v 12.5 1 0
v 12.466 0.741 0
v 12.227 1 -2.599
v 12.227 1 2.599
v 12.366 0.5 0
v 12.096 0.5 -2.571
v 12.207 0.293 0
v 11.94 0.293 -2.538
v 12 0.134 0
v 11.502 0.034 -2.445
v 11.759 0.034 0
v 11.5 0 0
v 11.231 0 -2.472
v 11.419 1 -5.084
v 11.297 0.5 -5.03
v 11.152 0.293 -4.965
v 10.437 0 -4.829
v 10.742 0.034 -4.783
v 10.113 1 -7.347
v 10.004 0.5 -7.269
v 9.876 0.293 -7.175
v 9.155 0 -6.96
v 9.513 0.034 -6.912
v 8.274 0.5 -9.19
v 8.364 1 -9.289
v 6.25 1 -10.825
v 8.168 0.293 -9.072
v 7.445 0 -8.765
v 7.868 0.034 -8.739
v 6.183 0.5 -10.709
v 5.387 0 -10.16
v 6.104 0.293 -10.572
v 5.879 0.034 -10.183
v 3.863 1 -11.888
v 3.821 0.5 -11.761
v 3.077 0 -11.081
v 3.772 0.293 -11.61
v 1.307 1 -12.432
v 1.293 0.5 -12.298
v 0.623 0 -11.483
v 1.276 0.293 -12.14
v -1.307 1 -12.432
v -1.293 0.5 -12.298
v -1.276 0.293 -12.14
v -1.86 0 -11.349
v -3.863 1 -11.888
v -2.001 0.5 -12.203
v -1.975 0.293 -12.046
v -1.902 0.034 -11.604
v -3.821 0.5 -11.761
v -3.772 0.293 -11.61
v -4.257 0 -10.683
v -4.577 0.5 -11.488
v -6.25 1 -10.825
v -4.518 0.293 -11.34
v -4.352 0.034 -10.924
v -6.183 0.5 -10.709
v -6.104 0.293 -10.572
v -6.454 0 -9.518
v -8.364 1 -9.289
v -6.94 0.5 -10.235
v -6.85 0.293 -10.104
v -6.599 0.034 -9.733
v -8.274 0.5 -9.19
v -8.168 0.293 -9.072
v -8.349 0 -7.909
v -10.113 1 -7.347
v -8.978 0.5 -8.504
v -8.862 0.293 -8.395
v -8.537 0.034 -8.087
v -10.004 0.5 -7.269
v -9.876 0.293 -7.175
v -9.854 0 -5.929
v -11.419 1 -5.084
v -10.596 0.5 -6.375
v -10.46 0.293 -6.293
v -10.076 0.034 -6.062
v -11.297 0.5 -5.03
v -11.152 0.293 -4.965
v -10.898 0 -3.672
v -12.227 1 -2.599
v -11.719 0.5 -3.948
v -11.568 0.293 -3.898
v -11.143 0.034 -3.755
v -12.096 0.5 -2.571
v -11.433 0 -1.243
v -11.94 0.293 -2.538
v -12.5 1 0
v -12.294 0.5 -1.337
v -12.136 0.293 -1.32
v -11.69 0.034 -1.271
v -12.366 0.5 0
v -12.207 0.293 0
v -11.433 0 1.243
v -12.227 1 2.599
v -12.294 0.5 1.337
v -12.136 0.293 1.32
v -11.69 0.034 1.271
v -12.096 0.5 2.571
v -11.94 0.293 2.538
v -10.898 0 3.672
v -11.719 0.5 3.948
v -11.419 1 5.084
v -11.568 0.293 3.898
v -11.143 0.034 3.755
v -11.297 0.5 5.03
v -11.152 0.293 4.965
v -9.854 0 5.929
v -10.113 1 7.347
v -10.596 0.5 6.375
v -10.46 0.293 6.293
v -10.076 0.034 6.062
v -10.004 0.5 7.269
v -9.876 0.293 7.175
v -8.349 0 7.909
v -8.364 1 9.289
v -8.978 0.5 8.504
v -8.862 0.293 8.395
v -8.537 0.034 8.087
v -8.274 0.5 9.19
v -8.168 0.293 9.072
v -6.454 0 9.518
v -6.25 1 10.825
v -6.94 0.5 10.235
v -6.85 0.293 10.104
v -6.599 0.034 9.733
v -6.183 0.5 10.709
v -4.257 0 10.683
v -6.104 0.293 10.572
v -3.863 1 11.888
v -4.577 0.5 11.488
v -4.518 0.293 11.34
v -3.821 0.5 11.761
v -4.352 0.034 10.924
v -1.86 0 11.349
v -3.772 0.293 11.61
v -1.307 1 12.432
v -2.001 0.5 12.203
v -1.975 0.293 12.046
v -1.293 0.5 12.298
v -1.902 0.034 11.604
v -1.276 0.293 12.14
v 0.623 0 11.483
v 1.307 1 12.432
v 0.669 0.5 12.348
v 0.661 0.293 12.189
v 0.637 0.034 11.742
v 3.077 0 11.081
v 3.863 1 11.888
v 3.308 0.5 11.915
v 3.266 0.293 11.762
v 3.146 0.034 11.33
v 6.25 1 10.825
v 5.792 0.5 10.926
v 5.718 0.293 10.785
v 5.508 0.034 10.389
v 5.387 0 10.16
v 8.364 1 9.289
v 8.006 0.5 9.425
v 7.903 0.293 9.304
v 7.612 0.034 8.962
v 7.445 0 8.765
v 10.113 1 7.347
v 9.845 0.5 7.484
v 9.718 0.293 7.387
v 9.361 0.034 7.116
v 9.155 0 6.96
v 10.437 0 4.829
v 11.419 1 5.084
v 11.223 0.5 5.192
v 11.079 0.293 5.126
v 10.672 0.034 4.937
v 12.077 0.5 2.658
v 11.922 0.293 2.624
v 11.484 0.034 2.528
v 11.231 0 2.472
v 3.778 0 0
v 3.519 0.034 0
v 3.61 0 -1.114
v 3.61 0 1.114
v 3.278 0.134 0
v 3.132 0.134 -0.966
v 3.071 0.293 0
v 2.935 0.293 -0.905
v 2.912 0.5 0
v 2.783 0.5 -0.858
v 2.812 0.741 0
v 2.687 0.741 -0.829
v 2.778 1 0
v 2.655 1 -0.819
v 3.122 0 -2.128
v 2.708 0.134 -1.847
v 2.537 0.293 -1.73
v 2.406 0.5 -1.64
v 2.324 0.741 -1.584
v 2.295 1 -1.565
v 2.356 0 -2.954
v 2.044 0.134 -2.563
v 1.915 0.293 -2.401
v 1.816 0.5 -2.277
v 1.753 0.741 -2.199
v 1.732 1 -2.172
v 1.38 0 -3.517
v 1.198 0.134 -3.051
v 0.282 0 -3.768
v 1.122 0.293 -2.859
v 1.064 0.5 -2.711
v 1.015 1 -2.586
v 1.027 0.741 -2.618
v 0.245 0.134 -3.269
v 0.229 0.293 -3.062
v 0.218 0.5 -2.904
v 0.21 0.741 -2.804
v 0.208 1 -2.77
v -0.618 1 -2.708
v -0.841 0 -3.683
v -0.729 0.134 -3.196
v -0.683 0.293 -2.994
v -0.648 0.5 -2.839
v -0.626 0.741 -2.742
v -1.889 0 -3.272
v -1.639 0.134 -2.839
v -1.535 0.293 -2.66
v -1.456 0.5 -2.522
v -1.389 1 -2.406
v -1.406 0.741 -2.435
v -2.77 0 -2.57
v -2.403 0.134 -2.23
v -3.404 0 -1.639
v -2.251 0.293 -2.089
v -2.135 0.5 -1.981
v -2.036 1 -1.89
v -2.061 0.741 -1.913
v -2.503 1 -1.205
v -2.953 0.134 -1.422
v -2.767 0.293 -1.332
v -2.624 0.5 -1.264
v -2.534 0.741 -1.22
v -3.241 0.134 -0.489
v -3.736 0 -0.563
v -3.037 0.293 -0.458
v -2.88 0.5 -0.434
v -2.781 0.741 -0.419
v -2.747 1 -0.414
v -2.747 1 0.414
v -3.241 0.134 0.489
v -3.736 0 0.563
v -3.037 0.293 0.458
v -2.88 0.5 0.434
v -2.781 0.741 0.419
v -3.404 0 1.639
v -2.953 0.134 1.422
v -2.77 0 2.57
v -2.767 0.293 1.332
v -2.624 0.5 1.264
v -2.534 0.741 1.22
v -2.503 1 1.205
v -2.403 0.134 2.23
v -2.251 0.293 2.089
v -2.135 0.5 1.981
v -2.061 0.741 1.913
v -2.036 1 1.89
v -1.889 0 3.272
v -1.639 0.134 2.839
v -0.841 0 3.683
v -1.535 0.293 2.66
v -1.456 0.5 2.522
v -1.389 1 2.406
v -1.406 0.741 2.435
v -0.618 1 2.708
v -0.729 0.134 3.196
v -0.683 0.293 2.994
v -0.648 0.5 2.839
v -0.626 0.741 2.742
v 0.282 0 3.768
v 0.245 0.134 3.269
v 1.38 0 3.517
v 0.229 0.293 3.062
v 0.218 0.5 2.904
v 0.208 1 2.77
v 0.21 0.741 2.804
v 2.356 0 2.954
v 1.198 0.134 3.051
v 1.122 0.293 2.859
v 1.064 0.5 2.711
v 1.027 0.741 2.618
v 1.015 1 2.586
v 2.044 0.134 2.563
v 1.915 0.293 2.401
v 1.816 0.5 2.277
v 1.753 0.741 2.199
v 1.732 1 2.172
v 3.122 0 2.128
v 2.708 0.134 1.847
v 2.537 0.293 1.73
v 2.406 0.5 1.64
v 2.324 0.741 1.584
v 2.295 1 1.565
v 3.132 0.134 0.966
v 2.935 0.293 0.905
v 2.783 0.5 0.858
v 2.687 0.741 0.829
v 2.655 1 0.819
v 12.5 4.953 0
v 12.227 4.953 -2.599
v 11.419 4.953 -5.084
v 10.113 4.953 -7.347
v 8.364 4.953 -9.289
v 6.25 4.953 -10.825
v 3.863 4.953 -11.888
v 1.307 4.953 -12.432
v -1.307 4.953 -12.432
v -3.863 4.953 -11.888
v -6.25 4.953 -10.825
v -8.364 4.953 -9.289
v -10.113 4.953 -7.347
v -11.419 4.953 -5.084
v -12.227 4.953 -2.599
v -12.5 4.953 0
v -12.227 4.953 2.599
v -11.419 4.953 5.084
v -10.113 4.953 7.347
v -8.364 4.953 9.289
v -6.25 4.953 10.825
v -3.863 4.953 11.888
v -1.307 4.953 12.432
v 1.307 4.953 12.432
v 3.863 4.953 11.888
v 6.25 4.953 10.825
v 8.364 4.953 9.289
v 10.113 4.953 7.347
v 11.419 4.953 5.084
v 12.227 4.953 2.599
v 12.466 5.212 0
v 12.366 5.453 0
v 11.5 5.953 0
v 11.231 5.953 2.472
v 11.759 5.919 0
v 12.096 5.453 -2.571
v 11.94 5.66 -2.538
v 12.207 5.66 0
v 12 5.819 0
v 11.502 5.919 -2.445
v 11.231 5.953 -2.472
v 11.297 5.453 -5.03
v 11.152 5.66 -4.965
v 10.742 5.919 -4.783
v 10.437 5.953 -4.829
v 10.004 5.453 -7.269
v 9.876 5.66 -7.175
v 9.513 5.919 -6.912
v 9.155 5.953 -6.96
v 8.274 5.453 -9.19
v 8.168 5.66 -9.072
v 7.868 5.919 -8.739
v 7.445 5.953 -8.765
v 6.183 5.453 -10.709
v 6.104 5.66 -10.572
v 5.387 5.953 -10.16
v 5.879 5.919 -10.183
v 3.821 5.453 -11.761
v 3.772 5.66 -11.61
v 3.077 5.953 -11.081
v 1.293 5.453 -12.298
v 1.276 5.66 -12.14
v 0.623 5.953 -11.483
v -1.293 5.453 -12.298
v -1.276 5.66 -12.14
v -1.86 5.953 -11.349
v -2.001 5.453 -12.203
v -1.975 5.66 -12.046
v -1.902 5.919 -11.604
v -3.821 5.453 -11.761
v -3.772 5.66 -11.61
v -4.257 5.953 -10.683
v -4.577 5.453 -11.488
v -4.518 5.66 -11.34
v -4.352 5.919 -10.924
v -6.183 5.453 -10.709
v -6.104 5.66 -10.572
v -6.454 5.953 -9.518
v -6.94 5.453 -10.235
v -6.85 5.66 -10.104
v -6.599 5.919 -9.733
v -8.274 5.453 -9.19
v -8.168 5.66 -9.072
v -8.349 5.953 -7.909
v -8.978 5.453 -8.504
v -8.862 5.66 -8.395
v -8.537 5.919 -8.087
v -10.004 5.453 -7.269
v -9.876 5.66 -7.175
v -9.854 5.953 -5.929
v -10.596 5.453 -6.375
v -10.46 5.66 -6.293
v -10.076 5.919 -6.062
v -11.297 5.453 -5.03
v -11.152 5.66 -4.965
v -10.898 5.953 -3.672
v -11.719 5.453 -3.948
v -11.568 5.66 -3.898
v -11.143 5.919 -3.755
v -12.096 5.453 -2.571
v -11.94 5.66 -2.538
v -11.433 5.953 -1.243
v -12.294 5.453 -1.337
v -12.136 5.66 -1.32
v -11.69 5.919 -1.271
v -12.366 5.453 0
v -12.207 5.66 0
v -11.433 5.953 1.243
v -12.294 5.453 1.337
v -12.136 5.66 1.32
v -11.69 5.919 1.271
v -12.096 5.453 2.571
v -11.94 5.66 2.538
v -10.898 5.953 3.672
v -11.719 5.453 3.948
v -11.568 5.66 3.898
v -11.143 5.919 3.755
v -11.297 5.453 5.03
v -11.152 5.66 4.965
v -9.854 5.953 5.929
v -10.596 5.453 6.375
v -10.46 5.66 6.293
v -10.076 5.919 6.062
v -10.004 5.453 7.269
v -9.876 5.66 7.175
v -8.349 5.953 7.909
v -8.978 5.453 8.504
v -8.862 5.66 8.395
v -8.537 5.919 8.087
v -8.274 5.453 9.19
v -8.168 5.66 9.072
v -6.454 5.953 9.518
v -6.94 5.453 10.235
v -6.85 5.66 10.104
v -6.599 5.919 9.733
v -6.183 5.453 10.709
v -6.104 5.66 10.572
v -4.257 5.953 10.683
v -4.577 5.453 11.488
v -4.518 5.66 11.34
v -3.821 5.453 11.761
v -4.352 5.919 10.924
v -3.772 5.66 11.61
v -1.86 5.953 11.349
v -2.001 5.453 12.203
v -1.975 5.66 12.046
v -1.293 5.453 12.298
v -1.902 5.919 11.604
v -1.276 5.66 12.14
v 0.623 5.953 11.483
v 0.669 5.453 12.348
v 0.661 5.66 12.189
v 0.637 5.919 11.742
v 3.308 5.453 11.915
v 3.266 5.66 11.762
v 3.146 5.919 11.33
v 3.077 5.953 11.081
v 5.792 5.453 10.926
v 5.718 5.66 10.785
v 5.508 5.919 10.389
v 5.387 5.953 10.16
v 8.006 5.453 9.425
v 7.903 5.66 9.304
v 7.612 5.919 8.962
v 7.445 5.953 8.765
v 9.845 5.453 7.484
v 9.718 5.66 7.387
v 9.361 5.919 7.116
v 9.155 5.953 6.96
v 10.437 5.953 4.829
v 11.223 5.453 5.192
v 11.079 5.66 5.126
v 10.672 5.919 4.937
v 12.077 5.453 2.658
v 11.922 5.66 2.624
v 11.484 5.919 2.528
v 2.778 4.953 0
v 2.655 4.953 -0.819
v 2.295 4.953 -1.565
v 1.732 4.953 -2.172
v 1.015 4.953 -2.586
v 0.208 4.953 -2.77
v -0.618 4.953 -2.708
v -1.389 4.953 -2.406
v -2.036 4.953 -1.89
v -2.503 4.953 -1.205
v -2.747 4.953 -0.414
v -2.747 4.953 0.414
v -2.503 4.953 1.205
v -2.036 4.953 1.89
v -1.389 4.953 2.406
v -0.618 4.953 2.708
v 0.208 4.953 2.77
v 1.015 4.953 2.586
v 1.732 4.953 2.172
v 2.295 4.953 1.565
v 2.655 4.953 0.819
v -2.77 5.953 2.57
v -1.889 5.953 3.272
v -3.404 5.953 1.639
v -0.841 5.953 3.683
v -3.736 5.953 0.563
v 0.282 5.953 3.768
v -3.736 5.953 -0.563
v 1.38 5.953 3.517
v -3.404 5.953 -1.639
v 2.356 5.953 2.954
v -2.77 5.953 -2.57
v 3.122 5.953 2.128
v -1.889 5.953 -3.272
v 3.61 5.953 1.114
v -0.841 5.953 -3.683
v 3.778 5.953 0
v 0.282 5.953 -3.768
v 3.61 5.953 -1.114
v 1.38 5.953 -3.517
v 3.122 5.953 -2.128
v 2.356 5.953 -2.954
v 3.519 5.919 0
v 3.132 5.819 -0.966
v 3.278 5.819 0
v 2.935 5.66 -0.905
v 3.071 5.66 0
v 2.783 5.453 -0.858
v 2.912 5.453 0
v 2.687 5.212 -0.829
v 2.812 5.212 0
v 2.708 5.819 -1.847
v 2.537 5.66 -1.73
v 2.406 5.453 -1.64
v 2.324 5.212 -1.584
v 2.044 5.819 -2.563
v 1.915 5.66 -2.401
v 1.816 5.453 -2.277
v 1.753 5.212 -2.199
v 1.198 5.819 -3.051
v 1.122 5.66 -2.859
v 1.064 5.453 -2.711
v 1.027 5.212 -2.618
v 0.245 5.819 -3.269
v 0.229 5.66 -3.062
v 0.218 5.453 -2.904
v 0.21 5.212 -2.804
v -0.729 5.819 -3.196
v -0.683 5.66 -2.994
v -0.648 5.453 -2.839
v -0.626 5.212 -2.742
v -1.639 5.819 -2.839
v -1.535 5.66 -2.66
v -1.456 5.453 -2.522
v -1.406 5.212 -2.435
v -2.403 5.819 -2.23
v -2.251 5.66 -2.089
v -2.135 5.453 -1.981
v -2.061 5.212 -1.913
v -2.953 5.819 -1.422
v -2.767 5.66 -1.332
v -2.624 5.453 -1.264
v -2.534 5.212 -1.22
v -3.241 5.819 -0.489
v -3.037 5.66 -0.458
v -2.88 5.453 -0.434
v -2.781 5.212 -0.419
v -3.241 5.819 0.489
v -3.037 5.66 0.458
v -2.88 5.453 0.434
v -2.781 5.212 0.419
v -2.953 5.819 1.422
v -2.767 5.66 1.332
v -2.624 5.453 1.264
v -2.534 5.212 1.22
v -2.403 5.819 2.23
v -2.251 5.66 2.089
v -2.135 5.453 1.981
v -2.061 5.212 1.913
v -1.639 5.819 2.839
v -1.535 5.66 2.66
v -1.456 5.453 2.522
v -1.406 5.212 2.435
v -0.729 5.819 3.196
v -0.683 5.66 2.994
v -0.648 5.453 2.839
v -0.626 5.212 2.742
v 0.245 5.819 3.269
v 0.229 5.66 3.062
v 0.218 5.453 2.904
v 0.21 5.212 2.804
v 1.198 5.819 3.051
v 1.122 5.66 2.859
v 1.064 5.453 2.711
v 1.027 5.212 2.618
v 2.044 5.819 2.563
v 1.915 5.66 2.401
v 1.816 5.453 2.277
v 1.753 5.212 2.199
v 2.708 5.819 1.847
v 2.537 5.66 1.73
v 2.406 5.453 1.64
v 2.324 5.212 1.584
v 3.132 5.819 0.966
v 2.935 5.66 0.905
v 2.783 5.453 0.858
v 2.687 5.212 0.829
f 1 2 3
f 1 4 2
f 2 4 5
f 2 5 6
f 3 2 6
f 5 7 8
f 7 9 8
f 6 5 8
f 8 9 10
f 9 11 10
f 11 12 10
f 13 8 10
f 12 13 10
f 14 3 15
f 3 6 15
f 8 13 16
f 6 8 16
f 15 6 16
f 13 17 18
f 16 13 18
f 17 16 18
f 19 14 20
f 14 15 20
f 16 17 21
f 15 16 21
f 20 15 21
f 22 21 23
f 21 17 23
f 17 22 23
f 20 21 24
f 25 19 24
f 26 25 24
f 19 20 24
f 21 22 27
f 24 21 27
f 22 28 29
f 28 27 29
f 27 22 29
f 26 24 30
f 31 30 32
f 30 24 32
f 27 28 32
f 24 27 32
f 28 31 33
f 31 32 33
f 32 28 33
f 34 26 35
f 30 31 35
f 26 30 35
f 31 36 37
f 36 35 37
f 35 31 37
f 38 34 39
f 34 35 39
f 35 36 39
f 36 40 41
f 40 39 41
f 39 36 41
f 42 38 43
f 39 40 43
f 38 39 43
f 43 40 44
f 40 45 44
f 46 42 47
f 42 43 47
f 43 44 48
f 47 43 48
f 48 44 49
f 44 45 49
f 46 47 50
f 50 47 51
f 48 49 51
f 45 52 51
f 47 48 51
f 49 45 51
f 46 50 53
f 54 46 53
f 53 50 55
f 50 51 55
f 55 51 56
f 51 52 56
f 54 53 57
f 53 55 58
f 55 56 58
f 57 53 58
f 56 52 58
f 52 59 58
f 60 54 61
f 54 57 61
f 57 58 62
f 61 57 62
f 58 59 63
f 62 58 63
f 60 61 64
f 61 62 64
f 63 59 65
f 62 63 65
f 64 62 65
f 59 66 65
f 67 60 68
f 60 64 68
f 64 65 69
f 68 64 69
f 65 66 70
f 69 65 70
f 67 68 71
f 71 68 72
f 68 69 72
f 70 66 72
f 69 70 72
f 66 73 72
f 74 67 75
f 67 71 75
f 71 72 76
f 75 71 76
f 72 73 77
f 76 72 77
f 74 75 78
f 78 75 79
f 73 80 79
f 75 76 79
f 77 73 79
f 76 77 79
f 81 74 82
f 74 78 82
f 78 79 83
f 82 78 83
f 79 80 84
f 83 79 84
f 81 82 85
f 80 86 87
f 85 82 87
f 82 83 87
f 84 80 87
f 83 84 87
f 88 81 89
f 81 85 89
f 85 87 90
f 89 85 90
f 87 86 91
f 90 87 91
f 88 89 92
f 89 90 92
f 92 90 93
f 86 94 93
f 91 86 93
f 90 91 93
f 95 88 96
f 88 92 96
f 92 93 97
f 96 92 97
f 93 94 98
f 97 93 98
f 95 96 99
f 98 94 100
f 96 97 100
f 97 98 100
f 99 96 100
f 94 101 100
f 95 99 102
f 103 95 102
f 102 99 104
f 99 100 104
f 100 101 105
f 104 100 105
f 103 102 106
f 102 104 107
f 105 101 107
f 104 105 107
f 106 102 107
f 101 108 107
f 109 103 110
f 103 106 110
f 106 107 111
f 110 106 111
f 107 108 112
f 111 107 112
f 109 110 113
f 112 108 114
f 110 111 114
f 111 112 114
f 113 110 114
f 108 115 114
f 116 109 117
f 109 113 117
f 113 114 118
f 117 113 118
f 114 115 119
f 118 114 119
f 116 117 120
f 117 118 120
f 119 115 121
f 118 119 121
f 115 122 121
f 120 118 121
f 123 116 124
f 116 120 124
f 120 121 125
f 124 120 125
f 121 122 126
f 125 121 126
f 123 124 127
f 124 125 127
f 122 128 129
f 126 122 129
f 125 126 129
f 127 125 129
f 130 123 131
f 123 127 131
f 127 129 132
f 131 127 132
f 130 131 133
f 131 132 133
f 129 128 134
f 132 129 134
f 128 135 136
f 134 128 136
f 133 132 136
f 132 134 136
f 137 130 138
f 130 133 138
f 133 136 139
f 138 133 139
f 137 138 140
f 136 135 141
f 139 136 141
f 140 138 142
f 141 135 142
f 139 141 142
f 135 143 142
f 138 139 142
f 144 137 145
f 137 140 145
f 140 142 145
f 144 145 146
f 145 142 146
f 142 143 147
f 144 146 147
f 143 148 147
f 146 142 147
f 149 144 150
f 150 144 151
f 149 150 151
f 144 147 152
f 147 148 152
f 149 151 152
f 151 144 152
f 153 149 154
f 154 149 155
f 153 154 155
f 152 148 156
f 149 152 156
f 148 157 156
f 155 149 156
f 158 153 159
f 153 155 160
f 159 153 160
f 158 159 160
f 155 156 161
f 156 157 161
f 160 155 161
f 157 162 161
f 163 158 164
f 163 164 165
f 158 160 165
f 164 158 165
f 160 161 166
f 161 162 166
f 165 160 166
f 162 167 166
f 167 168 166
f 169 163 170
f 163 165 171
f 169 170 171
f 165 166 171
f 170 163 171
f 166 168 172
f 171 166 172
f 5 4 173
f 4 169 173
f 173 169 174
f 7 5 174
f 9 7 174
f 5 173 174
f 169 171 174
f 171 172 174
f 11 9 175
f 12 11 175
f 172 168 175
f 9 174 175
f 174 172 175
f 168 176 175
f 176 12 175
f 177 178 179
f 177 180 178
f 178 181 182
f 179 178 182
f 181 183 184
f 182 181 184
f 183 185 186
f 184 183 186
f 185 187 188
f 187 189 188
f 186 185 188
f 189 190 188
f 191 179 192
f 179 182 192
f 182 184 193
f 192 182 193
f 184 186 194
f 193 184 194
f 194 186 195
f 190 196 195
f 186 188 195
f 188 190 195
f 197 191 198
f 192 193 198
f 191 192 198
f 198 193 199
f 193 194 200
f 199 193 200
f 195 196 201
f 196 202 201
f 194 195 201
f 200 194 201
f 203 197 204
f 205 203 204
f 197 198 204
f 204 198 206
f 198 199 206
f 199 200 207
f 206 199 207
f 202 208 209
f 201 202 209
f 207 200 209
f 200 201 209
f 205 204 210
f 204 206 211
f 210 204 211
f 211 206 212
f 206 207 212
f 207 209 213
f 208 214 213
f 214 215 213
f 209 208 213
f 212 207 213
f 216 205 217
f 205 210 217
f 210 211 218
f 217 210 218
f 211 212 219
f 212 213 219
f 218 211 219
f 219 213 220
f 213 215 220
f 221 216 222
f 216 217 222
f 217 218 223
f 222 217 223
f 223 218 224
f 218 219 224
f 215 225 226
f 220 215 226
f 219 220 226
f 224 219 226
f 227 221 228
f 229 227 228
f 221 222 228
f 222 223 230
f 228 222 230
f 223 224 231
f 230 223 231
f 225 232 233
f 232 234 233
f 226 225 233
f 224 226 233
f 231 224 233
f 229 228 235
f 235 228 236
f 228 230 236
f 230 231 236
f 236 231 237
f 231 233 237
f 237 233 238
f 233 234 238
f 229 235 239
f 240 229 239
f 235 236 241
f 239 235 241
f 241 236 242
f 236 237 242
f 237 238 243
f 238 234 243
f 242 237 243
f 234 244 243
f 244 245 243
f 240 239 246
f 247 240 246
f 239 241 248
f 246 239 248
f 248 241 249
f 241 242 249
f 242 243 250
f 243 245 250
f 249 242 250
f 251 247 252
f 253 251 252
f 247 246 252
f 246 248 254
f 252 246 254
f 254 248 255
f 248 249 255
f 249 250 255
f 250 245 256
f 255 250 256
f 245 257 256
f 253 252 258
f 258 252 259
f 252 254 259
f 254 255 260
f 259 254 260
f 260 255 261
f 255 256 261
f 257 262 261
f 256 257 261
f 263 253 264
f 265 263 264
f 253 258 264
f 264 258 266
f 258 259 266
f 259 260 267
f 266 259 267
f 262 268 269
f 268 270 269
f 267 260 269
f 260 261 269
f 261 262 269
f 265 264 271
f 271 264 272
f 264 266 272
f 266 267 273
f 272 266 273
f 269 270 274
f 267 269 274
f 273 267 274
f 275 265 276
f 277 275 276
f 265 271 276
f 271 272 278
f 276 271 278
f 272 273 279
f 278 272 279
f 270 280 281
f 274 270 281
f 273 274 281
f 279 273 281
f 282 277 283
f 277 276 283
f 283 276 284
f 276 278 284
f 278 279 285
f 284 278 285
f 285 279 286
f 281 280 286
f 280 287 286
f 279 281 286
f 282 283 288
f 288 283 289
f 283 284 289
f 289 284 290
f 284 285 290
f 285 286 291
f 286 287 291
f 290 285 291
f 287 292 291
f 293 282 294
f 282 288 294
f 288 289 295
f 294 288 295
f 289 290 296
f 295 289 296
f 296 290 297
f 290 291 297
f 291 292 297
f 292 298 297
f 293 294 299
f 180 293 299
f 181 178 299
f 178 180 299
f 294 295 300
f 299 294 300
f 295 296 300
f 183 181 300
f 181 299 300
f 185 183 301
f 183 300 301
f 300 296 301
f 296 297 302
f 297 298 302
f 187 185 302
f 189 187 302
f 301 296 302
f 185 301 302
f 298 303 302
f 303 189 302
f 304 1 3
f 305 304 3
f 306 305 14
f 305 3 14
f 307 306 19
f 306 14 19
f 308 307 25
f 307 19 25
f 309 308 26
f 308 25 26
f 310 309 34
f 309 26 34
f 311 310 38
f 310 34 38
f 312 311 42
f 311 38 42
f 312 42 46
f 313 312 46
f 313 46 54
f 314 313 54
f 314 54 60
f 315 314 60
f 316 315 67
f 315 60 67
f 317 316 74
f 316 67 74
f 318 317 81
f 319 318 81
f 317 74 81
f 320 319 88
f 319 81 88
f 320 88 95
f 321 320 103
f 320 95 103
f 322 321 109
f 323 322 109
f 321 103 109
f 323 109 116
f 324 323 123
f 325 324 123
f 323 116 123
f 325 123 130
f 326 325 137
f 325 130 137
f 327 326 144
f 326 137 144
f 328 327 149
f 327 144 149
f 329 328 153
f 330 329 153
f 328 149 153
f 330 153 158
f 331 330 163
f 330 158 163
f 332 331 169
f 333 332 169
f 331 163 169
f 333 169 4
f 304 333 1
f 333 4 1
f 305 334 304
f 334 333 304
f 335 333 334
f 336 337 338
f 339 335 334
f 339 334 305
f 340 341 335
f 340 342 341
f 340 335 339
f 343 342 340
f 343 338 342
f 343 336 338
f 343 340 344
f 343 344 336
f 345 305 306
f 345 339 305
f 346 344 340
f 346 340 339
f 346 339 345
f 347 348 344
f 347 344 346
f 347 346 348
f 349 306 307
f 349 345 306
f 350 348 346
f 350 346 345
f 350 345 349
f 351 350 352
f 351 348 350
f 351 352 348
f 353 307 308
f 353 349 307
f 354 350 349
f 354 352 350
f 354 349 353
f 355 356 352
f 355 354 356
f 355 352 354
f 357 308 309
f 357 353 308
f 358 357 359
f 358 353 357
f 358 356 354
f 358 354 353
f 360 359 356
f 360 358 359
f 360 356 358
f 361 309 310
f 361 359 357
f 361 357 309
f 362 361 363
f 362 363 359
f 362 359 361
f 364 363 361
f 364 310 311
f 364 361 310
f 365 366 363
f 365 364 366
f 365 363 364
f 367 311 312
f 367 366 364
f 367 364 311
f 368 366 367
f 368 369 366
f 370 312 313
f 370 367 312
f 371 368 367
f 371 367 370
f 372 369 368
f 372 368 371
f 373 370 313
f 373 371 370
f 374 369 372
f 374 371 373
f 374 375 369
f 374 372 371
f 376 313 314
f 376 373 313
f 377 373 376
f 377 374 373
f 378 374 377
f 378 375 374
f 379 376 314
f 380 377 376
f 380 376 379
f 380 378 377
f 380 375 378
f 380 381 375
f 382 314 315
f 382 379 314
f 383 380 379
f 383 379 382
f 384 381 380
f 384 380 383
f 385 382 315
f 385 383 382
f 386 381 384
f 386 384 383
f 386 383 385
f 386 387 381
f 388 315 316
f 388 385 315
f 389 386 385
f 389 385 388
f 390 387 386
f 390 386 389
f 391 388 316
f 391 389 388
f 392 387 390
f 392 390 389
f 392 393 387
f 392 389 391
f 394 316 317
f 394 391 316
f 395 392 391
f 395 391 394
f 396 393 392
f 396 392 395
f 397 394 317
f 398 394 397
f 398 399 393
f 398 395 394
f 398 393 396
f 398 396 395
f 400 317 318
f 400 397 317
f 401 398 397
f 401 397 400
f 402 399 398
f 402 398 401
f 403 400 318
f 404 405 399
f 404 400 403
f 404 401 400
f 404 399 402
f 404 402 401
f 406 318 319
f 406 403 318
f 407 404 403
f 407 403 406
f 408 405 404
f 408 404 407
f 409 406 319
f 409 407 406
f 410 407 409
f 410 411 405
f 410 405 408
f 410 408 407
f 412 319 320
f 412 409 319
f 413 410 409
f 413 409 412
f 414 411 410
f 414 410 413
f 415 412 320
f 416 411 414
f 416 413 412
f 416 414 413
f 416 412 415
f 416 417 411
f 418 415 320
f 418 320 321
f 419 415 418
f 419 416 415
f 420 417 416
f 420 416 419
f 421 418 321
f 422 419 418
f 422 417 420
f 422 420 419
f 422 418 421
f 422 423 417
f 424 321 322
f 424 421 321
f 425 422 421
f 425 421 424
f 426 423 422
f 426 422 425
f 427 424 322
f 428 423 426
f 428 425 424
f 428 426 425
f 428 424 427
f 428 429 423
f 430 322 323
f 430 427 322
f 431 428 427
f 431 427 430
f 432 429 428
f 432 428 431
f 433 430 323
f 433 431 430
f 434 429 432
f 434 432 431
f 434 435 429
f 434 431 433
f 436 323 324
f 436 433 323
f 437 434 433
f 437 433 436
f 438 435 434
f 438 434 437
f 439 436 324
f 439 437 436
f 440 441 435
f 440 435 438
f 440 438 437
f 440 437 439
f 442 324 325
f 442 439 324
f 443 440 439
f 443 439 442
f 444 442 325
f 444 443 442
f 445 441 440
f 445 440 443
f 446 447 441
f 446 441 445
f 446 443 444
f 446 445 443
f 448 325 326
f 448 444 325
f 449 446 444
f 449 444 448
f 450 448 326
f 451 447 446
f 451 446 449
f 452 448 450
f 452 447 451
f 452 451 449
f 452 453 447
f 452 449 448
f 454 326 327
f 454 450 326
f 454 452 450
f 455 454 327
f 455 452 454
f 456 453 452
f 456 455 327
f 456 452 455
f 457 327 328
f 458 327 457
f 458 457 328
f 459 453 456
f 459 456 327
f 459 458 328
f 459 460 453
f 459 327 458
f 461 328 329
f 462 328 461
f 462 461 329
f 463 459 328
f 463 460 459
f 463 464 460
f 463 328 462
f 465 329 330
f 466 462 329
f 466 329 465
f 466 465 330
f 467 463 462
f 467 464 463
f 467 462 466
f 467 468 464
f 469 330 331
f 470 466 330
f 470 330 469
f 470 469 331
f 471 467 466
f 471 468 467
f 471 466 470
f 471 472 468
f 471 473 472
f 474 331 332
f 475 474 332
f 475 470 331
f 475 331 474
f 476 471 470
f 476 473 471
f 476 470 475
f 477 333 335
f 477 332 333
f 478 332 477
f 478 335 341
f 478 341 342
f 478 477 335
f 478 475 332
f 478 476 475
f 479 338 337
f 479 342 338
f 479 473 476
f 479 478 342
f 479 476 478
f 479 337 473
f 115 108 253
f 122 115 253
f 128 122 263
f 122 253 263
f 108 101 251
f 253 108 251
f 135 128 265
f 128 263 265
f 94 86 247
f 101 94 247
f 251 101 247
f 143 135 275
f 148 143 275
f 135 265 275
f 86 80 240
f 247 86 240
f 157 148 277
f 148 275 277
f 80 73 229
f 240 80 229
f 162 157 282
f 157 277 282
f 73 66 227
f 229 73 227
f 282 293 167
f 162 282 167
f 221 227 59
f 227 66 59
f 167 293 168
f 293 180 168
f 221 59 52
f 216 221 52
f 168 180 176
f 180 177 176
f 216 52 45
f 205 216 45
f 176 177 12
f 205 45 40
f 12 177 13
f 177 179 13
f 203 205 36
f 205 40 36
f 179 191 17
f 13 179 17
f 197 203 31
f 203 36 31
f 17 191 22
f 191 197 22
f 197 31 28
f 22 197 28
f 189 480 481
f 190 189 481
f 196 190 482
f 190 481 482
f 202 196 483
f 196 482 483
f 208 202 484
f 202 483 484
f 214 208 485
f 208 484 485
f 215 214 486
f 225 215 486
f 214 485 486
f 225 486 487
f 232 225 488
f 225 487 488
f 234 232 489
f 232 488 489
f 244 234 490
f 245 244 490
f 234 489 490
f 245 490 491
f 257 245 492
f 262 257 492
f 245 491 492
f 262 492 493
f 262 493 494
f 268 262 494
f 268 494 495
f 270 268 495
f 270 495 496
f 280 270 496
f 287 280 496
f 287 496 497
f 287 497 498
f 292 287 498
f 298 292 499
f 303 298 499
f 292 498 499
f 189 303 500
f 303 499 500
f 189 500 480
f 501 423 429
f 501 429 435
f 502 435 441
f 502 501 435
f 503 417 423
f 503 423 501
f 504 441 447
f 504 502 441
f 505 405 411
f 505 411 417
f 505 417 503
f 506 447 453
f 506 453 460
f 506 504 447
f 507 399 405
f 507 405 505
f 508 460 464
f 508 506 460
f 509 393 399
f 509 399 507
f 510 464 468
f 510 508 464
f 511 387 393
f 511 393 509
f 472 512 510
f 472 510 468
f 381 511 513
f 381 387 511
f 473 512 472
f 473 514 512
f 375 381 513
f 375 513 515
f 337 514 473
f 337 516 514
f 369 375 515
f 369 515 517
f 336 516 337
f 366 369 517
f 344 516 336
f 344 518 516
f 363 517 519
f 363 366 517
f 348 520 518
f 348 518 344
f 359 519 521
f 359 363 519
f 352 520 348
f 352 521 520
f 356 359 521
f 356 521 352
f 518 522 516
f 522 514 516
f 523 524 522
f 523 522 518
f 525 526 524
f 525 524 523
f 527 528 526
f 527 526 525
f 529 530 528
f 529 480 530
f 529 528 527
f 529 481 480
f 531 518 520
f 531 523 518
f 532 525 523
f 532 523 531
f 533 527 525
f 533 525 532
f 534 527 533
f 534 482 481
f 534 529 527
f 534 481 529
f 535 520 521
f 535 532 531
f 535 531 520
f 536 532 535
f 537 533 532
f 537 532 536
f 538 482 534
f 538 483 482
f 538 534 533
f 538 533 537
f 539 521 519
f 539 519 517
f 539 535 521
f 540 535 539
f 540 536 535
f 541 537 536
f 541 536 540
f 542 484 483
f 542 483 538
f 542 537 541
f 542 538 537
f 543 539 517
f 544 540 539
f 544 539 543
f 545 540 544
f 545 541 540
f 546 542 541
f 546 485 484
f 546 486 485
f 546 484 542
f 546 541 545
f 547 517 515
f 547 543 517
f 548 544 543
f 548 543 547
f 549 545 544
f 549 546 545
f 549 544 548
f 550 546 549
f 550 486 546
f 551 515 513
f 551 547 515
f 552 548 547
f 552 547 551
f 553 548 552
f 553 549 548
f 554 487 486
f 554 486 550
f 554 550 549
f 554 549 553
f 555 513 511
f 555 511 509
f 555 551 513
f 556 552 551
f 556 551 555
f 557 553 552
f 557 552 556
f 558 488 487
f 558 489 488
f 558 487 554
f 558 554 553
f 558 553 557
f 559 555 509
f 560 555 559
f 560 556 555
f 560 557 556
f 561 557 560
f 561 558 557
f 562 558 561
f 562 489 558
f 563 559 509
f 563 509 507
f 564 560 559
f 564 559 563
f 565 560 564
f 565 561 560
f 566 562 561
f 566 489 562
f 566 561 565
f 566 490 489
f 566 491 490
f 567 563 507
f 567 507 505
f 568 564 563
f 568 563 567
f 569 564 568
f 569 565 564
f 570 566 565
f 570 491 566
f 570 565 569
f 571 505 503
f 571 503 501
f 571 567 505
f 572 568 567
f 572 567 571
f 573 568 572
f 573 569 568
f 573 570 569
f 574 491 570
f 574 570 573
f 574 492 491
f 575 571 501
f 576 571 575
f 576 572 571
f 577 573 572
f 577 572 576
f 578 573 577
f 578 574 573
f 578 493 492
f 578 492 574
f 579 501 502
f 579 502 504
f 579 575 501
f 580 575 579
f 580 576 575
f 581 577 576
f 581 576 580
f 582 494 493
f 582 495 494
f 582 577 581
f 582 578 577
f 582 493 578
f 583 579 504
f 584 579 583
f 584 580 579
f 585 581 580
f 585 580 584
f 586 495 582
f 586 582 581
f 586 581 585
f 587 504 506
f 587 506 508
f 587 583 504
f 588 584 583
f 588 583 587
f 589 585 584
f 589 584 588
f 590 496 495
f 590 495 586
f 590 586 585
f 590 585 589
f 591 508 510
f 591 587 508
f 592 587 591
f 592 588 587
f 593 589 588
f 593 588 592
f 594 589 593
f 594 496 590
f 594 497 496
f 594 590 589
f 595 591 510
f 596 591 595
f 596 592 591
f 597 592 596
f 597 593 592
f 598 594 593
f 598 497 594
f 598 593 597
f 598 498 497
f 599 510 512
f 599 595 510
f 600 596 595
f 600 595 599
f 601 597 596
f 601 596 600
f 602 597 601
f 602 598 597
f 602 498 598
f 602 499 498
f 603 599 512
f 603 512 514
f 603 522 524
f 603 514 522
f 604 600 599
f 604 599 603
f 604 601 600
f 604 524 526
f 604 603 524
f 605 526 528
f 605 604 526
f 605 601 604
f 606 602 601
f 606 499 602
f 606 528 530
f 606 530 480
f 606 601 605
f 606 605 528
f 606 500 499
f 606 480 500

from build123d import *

# Parameters (mm, degrees)
SKETCH1_R           = 12.5
BOSS_EXTRUDE1_DEPTH = 5.953125
SKETCH2_R           = 2.7781
CUT_EXTRUDE1_DEPTH  = 5.953125
FILLET1_R           = 1


with BuildPart() as part:
    # Sketch1 → Boss-Extrude1 (new body)
    with BuildSketch(Plane(origin=(0, 0, 0), x_dir=(1, 0, 0), z_dir=(0, 1, 0))):
        Circle(SKETCH1_R)
    extrude(amount=BOSS_EXTRUDE1_DEPTH)

    # Sketch2 → Cut-Extrude1 (cut)
    with BuildSketch(Plane(origin=(0, 5.953125, 0), x_dir=(1, 0, 0), z_dir=(0, 1, 0))):
        Circle(SKETCH2_R)
    extrude(amount=-CUT_EXTRUDE1_DEPTH, mode=Mode.SUBTRACT)

    # Fillet1
    fillet1_edges = [part.edges().sort_by_distance(p)[0] for p in [
        (-12.5, 0, 0),
        (-12.5, 5.953125, 0),
        (-2.7781, 5.953125, 0),
        (-2.7781, 0, 0),
    ]]
    fillet(fillet1_edges, radius=FILLET1_R)


solid = part.part
